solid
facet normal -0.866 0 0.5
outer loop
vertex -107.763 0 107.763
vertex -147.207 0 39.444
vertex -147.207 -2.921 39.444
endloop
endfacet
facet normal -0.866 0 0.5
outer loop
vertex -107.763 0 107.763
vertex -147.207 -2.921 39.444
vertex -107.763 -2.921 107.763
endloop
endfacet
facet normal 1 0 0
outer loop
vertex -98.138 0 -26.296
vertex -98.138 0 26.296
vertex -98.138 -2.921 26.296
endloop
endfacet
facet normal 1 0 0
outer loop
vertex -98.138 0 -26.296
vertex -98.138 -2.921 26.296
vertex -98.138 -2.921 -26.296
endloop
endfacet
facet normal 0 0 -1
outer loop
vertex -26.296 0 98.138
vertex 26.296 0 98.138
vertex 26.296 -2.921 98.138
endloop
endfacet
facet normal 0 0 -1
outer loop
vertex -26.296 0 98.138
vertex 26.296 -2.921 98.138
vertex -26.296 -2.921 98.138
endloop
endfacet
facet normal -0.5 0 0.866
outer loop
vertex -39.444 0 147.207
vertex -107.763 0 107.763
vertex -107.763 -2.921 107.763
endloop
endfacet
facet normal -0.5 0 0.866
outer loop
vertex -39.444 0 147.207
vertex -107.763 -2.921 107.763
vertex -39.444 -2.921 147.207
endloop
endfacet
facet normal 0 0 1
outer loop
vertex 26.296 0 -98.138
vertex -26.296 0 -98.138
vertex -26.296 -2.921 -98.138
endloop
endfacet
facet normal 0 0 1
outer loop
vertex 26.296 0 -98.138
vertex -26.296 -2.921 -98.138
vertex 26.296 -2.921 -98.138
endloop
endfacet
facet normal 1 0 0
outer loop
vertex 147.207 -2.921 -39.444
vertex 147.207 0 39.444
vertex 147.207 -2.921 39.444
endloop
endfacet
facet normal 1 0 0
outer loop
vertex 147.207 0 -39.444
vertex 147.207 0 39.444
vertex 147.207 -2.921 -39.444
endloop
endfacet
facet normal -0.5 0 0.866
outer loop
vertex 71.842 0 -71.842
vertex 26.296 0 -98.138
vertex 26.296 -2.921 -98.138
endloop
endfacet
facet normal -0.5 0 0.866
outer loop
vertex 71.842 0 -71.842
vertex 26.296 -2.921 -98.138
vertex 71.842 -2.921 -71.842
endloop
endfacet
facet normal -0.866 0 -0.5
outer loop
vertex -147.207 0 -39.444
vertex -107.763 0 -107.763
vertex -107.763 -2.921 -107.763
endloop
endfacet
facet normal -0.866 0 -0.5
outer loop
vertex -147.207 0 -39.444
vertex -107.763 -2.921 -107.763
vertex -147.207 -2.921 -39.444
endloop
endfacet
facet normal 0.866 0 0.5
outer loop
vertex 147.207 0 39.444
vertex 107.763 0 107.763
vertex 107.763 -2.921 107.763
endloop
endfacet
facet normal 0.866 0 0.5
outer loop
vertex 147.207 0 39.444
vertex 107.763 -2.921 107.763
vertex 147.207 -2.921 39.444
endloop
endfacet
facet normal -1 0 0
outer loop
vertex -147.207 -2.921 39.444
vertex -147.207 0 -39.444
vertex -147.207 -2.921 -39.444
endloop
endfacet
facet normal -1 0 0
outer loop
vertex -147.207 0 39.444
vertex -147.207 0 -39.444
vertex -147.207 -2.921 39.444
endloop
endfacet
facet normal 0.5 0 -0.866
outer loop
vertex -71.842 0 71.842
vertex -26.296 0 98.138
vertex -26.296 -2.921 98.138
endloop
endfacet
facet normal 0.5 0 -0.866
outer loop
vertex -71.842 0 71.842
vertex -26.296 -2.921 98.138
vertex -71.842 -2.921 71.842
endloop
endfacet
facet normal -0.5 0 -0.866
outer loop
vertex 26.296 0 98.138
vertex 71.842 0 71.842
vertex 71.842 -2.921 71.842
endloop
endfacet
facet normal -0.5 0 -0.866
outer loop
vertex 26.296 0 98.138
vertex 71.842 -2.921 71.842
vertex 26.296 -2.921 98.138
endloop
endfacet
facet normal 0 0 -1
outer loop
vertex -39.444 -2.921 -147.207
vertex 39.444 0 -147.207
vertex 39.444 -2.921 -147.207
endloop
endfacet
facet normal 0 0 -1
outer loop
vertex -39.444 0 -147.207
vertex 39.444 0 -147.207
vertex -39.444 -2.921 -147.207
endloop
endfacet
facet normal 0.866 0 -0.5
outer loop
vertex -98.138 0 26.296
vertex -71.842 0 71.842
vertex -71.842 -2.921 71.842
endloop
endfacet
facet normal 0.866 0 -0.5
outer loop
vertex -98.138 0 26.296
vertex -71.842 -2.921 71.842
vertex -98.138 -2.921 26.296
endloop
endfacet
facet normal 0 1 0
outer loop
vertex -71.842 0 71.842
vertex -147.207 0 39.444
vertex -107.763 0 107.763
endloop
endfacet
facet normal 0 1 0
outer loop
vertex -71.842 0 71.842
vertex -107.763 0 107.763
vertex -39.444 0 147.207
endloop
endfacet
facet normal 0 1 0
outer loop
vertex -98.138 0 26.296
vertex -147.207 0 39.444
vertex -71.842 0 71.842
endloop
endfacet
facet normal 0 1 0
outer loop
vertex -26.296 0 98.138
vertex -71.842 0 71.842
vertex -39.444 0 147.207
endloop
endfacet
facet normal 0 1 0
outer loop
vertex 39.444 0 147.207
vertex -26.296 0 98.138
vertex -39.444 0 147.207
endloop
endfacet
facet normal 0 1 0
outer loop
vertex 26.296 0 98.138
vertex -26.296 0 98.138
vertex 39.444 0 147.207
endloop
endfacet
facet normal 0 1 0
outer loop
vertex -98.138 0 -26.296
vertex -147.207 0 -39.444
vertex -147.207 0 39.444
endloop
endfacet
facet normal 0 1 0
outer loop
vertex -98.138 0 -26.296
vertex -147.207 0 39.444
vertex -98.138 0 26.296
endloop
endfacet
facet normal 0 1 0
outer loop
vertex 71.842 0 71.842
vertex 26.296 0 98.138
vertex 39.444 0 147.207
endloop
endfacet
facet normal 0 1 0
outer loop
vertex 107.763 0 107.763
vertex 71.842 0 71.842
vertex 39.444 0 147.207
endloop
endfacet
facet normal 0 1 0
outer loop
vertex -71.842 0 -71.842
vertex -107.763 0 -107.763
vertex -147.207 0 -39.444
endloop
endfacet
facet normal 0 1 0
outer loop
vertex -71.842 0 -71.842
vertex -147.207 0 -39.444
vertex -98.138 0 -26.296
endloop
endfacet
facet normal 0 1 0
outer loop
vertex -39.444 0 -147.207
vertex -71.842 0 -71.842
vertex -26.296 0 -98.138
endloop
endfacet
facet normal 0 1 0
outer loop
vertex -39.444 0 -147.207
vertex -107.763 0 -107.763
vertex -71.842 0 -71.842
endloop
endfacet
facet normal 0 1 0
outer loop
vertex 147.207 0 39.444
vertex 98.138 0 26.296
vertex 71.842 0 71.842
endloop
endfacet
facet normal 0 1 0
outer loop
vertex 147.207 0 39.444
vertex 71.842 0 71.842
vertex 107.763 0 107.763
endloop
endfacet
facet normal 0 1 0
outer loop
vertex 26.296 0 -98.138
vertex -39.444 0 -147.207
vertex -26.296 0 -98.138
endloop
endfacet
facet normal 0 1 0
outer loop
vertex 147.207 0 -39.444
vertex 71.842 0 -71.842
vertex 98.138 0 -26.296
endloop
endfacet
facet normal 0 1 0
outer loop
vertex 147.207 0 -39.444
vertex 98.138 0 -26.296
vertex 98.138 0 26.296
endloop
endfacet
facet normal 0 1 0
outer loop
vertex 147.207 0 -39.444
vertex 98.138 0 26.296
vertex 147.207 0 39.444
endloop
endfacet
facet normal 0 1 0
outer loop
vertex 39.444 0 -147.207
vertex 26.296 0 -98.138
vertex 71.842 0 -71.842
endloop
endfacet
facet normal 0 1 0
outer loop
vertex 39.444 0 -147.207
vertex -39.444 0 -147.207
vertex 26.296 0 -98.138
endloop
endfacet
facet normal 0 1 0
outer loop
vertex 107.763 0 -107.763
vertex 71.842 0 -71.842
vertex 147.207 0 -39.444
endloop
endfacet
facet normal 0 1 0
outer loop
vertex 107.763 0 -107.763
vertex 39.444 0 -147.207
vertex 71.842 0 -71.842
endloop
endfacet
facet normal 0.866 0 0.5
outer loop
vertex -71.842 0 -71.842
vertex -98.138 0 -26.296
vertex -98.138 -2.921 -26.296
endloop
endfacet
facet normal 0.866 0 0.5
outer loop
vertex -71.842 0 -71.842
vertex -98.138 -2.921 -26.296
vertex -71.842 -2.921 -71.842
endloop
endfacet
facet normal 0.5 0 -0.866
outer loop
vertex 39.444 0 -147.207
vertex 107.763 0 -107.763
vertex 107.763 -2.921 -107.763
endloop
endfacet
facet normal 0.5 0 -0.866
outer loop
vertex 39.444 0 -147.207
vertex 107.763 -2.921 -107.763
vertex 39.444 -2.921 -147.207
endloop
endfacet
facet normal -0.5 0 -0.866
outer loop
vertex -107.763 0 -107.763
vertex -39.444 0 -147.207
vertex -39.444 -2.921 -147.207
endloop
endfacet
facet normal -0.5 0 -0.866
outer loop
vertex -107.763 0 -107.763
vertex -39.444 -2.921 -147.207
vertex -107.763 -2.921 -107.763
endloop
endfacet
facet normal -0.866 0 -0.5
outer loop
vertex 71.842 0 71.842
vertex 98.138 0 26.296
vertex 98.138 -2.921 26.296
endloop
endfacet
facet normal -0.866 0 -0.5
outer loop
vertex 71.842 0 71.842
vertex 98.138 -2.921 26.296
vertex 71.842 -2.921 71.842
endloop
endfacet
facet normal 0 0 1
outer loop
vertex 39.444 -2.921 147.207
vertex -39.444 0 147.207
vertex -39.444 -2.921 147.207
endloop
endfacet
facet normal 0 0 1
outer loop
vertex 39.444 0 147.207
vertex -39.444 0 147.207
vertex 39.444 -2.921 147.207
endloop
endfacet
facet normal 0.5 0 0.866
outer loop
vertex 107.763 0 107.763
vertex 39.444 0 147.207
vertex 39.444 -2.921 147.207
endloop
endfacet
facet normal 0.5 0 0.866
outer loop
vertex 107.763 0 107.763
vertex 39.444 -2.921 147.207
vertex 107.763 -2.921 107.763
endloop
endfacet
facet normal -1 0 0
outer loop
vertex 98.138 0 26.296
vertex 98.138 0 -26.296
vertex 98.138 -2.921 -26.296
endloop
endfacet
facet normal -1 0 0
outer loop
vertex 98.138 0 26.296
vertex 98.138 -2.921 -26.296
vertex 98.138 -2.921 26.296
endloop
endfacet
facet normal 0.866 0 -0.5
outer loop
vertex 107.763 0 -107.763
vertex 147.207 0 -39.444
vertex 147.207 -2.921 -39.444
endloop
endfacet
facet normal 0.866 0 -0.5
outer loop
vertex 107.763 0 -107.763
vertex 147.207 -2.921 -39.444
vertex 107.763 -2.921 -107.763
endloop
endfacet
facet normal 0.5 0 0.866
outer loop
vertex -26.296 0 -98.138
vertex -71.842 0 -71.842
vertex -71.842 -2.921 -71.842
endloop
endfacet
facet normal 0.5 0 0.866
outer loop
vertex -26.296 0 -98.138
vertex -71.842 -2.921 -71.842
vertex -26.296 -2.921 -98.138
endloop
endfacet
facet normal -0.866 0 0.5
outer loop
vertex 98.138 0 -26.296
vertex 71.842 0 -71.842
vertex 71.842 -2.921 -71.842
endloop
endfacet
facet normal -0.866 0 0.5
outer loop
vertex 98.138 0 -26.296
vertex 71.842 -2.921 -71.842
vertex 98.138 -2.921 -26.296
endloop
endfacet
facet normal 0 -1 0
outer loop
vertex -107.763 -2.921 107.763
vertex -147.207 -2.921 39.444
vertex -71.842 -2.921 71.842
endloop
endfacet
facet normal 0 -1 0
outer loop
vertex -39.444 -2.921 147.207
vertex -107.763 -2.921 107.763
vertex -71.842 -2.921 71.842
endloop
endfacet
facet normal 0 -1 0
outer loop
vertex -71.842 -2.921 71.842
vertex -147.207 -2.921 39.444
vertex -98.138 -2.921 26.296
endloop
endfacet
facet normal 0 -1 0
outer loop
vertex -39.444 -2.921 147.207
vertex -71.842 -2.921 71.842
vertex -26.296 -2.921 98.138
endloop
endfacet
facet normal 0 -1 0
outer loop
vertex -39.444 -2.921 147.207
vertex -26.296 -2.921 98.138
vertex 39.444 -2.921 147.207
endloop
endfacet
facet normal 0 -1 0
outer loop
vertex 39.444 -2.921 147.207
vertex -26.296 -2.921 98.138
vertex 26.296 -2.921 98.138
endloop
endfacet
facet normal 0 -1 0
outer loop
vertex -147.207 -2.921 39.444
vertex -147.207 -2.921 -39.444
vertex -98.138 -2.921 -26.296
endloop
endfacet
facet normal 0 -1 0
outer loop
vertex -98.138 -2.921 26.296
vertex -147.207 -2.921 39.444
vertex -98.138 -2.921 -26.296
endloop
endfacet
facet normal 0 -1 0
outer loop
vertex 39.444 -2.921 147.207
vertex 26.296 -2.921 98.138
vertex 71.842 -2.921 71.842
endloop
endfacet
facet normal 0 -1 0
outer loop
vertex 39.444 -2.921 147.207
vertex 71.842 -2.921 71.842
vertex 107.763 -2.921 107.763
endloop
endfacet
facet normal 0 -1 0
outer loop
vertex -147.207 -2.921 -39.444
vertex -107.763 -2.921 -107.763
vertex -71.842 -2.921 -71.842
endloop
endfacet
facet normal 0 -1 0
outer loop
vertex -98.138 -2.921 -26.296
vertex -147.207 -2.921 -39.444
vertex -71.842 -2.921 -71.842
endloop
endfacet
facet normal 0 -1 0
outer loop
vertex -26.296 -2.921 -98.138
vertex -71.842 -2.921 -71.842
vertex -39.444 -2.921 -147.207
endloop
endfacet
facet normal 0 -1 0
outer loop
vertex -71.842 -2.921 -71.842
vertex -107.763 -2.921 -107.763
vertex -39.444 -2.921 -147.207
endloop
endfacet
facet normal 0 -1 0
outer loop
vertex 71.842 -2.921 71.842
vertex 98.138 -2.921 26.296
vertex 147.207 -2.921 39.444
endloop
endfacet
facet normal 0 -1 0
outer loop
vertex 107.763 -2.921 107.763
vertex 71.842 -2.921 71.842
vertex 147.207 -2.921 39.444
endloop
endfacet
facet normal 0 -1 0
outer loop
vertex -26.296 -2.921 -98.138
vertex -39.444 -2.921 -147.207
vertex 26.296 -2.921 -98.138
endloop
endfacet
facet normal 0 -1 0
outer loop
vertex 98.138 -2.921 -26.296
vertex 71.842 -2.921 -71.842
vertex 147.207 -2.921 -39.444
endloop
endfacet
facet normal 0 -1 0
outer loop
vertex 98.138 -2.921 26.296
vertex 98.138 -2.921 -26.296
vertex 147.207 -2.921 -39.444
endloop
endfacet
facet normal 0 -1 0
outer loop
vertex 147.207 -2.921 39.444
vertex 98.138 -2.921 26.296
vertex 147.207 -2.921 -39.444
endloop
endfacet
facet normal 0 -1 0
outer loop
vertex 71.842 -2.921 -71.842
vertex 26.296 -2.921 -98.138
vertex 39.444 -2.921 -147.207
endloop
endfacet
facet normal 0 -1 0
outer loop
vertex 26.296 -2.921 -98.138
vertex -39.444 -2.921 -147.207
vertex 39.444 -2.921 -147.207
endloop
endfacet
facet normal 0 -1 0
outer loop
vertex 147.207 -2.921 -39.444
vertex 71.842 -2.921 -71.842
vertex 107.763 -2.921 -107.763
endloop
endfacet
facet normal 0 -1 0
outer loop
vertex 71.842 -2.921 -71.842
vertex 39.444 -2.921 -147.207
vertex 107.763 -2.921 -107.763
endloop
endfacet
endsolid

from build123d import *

# Parameters (mm, degrees)
BOSS_EXTRUDE1_DEPTH = 2.921
CUT_EXTRUDE1_DEPTH  = 209.202762766


with BuildPart() as part:
    # Sketch1 → Boss-Extrude1 (new body)
    with BuildSketch(Plane(origin=(0, 0, 0), x_dir=(1, 0, 0), z_dir=(0, 1, 0))):
        Polygon((147.207095926, 39.444022474), (107.763073453, 107.763073453), (39.444022474, 147.207095926), (-39.444022474, 147.207095926), (-107.763073453, 107.763073453), (-147.207095926, 39.444022474), (-147.207095926, -39.444022474), (-107.763073453, -107.763073453), (-39.444022474, -147.207095926), (39.444022474, -147.207095926), (107.763073453, -107.763073453), (147.207095926, -39.444022474), align=None)
    extrude(amount=-BOSS_EXTRUDE1_DEPTH)

    # Sketch3 → Cut-Extrude1 (cut, through all)
    with BuildSketch(Plane(origin=(0, 0, 0), x_dir=(1, 0, 0), z_dir=(0, 1, 0))):
        Polygon((-98.138063951, 26.296014982), (-71.842048969, 71.842048969), (-26.296014982, 98.138063951), (26.296014982, 98.138063951), (71.842048969, 71.842048969), (98.138063951, 26.296014982), (98.138063951, -26.296014982), (71.842048969, -71.842048969), (26.296014982, -98.138063951), (-26.296014982, -98.138063951), (-71.842048969, -71.842048969), (-98.138063951, -26.296014982), align=None)
    extrude(amount=-CUT_EXTRUDE1_DEPTH, mode=Mode.SUBTRACT)


solid = part.part
